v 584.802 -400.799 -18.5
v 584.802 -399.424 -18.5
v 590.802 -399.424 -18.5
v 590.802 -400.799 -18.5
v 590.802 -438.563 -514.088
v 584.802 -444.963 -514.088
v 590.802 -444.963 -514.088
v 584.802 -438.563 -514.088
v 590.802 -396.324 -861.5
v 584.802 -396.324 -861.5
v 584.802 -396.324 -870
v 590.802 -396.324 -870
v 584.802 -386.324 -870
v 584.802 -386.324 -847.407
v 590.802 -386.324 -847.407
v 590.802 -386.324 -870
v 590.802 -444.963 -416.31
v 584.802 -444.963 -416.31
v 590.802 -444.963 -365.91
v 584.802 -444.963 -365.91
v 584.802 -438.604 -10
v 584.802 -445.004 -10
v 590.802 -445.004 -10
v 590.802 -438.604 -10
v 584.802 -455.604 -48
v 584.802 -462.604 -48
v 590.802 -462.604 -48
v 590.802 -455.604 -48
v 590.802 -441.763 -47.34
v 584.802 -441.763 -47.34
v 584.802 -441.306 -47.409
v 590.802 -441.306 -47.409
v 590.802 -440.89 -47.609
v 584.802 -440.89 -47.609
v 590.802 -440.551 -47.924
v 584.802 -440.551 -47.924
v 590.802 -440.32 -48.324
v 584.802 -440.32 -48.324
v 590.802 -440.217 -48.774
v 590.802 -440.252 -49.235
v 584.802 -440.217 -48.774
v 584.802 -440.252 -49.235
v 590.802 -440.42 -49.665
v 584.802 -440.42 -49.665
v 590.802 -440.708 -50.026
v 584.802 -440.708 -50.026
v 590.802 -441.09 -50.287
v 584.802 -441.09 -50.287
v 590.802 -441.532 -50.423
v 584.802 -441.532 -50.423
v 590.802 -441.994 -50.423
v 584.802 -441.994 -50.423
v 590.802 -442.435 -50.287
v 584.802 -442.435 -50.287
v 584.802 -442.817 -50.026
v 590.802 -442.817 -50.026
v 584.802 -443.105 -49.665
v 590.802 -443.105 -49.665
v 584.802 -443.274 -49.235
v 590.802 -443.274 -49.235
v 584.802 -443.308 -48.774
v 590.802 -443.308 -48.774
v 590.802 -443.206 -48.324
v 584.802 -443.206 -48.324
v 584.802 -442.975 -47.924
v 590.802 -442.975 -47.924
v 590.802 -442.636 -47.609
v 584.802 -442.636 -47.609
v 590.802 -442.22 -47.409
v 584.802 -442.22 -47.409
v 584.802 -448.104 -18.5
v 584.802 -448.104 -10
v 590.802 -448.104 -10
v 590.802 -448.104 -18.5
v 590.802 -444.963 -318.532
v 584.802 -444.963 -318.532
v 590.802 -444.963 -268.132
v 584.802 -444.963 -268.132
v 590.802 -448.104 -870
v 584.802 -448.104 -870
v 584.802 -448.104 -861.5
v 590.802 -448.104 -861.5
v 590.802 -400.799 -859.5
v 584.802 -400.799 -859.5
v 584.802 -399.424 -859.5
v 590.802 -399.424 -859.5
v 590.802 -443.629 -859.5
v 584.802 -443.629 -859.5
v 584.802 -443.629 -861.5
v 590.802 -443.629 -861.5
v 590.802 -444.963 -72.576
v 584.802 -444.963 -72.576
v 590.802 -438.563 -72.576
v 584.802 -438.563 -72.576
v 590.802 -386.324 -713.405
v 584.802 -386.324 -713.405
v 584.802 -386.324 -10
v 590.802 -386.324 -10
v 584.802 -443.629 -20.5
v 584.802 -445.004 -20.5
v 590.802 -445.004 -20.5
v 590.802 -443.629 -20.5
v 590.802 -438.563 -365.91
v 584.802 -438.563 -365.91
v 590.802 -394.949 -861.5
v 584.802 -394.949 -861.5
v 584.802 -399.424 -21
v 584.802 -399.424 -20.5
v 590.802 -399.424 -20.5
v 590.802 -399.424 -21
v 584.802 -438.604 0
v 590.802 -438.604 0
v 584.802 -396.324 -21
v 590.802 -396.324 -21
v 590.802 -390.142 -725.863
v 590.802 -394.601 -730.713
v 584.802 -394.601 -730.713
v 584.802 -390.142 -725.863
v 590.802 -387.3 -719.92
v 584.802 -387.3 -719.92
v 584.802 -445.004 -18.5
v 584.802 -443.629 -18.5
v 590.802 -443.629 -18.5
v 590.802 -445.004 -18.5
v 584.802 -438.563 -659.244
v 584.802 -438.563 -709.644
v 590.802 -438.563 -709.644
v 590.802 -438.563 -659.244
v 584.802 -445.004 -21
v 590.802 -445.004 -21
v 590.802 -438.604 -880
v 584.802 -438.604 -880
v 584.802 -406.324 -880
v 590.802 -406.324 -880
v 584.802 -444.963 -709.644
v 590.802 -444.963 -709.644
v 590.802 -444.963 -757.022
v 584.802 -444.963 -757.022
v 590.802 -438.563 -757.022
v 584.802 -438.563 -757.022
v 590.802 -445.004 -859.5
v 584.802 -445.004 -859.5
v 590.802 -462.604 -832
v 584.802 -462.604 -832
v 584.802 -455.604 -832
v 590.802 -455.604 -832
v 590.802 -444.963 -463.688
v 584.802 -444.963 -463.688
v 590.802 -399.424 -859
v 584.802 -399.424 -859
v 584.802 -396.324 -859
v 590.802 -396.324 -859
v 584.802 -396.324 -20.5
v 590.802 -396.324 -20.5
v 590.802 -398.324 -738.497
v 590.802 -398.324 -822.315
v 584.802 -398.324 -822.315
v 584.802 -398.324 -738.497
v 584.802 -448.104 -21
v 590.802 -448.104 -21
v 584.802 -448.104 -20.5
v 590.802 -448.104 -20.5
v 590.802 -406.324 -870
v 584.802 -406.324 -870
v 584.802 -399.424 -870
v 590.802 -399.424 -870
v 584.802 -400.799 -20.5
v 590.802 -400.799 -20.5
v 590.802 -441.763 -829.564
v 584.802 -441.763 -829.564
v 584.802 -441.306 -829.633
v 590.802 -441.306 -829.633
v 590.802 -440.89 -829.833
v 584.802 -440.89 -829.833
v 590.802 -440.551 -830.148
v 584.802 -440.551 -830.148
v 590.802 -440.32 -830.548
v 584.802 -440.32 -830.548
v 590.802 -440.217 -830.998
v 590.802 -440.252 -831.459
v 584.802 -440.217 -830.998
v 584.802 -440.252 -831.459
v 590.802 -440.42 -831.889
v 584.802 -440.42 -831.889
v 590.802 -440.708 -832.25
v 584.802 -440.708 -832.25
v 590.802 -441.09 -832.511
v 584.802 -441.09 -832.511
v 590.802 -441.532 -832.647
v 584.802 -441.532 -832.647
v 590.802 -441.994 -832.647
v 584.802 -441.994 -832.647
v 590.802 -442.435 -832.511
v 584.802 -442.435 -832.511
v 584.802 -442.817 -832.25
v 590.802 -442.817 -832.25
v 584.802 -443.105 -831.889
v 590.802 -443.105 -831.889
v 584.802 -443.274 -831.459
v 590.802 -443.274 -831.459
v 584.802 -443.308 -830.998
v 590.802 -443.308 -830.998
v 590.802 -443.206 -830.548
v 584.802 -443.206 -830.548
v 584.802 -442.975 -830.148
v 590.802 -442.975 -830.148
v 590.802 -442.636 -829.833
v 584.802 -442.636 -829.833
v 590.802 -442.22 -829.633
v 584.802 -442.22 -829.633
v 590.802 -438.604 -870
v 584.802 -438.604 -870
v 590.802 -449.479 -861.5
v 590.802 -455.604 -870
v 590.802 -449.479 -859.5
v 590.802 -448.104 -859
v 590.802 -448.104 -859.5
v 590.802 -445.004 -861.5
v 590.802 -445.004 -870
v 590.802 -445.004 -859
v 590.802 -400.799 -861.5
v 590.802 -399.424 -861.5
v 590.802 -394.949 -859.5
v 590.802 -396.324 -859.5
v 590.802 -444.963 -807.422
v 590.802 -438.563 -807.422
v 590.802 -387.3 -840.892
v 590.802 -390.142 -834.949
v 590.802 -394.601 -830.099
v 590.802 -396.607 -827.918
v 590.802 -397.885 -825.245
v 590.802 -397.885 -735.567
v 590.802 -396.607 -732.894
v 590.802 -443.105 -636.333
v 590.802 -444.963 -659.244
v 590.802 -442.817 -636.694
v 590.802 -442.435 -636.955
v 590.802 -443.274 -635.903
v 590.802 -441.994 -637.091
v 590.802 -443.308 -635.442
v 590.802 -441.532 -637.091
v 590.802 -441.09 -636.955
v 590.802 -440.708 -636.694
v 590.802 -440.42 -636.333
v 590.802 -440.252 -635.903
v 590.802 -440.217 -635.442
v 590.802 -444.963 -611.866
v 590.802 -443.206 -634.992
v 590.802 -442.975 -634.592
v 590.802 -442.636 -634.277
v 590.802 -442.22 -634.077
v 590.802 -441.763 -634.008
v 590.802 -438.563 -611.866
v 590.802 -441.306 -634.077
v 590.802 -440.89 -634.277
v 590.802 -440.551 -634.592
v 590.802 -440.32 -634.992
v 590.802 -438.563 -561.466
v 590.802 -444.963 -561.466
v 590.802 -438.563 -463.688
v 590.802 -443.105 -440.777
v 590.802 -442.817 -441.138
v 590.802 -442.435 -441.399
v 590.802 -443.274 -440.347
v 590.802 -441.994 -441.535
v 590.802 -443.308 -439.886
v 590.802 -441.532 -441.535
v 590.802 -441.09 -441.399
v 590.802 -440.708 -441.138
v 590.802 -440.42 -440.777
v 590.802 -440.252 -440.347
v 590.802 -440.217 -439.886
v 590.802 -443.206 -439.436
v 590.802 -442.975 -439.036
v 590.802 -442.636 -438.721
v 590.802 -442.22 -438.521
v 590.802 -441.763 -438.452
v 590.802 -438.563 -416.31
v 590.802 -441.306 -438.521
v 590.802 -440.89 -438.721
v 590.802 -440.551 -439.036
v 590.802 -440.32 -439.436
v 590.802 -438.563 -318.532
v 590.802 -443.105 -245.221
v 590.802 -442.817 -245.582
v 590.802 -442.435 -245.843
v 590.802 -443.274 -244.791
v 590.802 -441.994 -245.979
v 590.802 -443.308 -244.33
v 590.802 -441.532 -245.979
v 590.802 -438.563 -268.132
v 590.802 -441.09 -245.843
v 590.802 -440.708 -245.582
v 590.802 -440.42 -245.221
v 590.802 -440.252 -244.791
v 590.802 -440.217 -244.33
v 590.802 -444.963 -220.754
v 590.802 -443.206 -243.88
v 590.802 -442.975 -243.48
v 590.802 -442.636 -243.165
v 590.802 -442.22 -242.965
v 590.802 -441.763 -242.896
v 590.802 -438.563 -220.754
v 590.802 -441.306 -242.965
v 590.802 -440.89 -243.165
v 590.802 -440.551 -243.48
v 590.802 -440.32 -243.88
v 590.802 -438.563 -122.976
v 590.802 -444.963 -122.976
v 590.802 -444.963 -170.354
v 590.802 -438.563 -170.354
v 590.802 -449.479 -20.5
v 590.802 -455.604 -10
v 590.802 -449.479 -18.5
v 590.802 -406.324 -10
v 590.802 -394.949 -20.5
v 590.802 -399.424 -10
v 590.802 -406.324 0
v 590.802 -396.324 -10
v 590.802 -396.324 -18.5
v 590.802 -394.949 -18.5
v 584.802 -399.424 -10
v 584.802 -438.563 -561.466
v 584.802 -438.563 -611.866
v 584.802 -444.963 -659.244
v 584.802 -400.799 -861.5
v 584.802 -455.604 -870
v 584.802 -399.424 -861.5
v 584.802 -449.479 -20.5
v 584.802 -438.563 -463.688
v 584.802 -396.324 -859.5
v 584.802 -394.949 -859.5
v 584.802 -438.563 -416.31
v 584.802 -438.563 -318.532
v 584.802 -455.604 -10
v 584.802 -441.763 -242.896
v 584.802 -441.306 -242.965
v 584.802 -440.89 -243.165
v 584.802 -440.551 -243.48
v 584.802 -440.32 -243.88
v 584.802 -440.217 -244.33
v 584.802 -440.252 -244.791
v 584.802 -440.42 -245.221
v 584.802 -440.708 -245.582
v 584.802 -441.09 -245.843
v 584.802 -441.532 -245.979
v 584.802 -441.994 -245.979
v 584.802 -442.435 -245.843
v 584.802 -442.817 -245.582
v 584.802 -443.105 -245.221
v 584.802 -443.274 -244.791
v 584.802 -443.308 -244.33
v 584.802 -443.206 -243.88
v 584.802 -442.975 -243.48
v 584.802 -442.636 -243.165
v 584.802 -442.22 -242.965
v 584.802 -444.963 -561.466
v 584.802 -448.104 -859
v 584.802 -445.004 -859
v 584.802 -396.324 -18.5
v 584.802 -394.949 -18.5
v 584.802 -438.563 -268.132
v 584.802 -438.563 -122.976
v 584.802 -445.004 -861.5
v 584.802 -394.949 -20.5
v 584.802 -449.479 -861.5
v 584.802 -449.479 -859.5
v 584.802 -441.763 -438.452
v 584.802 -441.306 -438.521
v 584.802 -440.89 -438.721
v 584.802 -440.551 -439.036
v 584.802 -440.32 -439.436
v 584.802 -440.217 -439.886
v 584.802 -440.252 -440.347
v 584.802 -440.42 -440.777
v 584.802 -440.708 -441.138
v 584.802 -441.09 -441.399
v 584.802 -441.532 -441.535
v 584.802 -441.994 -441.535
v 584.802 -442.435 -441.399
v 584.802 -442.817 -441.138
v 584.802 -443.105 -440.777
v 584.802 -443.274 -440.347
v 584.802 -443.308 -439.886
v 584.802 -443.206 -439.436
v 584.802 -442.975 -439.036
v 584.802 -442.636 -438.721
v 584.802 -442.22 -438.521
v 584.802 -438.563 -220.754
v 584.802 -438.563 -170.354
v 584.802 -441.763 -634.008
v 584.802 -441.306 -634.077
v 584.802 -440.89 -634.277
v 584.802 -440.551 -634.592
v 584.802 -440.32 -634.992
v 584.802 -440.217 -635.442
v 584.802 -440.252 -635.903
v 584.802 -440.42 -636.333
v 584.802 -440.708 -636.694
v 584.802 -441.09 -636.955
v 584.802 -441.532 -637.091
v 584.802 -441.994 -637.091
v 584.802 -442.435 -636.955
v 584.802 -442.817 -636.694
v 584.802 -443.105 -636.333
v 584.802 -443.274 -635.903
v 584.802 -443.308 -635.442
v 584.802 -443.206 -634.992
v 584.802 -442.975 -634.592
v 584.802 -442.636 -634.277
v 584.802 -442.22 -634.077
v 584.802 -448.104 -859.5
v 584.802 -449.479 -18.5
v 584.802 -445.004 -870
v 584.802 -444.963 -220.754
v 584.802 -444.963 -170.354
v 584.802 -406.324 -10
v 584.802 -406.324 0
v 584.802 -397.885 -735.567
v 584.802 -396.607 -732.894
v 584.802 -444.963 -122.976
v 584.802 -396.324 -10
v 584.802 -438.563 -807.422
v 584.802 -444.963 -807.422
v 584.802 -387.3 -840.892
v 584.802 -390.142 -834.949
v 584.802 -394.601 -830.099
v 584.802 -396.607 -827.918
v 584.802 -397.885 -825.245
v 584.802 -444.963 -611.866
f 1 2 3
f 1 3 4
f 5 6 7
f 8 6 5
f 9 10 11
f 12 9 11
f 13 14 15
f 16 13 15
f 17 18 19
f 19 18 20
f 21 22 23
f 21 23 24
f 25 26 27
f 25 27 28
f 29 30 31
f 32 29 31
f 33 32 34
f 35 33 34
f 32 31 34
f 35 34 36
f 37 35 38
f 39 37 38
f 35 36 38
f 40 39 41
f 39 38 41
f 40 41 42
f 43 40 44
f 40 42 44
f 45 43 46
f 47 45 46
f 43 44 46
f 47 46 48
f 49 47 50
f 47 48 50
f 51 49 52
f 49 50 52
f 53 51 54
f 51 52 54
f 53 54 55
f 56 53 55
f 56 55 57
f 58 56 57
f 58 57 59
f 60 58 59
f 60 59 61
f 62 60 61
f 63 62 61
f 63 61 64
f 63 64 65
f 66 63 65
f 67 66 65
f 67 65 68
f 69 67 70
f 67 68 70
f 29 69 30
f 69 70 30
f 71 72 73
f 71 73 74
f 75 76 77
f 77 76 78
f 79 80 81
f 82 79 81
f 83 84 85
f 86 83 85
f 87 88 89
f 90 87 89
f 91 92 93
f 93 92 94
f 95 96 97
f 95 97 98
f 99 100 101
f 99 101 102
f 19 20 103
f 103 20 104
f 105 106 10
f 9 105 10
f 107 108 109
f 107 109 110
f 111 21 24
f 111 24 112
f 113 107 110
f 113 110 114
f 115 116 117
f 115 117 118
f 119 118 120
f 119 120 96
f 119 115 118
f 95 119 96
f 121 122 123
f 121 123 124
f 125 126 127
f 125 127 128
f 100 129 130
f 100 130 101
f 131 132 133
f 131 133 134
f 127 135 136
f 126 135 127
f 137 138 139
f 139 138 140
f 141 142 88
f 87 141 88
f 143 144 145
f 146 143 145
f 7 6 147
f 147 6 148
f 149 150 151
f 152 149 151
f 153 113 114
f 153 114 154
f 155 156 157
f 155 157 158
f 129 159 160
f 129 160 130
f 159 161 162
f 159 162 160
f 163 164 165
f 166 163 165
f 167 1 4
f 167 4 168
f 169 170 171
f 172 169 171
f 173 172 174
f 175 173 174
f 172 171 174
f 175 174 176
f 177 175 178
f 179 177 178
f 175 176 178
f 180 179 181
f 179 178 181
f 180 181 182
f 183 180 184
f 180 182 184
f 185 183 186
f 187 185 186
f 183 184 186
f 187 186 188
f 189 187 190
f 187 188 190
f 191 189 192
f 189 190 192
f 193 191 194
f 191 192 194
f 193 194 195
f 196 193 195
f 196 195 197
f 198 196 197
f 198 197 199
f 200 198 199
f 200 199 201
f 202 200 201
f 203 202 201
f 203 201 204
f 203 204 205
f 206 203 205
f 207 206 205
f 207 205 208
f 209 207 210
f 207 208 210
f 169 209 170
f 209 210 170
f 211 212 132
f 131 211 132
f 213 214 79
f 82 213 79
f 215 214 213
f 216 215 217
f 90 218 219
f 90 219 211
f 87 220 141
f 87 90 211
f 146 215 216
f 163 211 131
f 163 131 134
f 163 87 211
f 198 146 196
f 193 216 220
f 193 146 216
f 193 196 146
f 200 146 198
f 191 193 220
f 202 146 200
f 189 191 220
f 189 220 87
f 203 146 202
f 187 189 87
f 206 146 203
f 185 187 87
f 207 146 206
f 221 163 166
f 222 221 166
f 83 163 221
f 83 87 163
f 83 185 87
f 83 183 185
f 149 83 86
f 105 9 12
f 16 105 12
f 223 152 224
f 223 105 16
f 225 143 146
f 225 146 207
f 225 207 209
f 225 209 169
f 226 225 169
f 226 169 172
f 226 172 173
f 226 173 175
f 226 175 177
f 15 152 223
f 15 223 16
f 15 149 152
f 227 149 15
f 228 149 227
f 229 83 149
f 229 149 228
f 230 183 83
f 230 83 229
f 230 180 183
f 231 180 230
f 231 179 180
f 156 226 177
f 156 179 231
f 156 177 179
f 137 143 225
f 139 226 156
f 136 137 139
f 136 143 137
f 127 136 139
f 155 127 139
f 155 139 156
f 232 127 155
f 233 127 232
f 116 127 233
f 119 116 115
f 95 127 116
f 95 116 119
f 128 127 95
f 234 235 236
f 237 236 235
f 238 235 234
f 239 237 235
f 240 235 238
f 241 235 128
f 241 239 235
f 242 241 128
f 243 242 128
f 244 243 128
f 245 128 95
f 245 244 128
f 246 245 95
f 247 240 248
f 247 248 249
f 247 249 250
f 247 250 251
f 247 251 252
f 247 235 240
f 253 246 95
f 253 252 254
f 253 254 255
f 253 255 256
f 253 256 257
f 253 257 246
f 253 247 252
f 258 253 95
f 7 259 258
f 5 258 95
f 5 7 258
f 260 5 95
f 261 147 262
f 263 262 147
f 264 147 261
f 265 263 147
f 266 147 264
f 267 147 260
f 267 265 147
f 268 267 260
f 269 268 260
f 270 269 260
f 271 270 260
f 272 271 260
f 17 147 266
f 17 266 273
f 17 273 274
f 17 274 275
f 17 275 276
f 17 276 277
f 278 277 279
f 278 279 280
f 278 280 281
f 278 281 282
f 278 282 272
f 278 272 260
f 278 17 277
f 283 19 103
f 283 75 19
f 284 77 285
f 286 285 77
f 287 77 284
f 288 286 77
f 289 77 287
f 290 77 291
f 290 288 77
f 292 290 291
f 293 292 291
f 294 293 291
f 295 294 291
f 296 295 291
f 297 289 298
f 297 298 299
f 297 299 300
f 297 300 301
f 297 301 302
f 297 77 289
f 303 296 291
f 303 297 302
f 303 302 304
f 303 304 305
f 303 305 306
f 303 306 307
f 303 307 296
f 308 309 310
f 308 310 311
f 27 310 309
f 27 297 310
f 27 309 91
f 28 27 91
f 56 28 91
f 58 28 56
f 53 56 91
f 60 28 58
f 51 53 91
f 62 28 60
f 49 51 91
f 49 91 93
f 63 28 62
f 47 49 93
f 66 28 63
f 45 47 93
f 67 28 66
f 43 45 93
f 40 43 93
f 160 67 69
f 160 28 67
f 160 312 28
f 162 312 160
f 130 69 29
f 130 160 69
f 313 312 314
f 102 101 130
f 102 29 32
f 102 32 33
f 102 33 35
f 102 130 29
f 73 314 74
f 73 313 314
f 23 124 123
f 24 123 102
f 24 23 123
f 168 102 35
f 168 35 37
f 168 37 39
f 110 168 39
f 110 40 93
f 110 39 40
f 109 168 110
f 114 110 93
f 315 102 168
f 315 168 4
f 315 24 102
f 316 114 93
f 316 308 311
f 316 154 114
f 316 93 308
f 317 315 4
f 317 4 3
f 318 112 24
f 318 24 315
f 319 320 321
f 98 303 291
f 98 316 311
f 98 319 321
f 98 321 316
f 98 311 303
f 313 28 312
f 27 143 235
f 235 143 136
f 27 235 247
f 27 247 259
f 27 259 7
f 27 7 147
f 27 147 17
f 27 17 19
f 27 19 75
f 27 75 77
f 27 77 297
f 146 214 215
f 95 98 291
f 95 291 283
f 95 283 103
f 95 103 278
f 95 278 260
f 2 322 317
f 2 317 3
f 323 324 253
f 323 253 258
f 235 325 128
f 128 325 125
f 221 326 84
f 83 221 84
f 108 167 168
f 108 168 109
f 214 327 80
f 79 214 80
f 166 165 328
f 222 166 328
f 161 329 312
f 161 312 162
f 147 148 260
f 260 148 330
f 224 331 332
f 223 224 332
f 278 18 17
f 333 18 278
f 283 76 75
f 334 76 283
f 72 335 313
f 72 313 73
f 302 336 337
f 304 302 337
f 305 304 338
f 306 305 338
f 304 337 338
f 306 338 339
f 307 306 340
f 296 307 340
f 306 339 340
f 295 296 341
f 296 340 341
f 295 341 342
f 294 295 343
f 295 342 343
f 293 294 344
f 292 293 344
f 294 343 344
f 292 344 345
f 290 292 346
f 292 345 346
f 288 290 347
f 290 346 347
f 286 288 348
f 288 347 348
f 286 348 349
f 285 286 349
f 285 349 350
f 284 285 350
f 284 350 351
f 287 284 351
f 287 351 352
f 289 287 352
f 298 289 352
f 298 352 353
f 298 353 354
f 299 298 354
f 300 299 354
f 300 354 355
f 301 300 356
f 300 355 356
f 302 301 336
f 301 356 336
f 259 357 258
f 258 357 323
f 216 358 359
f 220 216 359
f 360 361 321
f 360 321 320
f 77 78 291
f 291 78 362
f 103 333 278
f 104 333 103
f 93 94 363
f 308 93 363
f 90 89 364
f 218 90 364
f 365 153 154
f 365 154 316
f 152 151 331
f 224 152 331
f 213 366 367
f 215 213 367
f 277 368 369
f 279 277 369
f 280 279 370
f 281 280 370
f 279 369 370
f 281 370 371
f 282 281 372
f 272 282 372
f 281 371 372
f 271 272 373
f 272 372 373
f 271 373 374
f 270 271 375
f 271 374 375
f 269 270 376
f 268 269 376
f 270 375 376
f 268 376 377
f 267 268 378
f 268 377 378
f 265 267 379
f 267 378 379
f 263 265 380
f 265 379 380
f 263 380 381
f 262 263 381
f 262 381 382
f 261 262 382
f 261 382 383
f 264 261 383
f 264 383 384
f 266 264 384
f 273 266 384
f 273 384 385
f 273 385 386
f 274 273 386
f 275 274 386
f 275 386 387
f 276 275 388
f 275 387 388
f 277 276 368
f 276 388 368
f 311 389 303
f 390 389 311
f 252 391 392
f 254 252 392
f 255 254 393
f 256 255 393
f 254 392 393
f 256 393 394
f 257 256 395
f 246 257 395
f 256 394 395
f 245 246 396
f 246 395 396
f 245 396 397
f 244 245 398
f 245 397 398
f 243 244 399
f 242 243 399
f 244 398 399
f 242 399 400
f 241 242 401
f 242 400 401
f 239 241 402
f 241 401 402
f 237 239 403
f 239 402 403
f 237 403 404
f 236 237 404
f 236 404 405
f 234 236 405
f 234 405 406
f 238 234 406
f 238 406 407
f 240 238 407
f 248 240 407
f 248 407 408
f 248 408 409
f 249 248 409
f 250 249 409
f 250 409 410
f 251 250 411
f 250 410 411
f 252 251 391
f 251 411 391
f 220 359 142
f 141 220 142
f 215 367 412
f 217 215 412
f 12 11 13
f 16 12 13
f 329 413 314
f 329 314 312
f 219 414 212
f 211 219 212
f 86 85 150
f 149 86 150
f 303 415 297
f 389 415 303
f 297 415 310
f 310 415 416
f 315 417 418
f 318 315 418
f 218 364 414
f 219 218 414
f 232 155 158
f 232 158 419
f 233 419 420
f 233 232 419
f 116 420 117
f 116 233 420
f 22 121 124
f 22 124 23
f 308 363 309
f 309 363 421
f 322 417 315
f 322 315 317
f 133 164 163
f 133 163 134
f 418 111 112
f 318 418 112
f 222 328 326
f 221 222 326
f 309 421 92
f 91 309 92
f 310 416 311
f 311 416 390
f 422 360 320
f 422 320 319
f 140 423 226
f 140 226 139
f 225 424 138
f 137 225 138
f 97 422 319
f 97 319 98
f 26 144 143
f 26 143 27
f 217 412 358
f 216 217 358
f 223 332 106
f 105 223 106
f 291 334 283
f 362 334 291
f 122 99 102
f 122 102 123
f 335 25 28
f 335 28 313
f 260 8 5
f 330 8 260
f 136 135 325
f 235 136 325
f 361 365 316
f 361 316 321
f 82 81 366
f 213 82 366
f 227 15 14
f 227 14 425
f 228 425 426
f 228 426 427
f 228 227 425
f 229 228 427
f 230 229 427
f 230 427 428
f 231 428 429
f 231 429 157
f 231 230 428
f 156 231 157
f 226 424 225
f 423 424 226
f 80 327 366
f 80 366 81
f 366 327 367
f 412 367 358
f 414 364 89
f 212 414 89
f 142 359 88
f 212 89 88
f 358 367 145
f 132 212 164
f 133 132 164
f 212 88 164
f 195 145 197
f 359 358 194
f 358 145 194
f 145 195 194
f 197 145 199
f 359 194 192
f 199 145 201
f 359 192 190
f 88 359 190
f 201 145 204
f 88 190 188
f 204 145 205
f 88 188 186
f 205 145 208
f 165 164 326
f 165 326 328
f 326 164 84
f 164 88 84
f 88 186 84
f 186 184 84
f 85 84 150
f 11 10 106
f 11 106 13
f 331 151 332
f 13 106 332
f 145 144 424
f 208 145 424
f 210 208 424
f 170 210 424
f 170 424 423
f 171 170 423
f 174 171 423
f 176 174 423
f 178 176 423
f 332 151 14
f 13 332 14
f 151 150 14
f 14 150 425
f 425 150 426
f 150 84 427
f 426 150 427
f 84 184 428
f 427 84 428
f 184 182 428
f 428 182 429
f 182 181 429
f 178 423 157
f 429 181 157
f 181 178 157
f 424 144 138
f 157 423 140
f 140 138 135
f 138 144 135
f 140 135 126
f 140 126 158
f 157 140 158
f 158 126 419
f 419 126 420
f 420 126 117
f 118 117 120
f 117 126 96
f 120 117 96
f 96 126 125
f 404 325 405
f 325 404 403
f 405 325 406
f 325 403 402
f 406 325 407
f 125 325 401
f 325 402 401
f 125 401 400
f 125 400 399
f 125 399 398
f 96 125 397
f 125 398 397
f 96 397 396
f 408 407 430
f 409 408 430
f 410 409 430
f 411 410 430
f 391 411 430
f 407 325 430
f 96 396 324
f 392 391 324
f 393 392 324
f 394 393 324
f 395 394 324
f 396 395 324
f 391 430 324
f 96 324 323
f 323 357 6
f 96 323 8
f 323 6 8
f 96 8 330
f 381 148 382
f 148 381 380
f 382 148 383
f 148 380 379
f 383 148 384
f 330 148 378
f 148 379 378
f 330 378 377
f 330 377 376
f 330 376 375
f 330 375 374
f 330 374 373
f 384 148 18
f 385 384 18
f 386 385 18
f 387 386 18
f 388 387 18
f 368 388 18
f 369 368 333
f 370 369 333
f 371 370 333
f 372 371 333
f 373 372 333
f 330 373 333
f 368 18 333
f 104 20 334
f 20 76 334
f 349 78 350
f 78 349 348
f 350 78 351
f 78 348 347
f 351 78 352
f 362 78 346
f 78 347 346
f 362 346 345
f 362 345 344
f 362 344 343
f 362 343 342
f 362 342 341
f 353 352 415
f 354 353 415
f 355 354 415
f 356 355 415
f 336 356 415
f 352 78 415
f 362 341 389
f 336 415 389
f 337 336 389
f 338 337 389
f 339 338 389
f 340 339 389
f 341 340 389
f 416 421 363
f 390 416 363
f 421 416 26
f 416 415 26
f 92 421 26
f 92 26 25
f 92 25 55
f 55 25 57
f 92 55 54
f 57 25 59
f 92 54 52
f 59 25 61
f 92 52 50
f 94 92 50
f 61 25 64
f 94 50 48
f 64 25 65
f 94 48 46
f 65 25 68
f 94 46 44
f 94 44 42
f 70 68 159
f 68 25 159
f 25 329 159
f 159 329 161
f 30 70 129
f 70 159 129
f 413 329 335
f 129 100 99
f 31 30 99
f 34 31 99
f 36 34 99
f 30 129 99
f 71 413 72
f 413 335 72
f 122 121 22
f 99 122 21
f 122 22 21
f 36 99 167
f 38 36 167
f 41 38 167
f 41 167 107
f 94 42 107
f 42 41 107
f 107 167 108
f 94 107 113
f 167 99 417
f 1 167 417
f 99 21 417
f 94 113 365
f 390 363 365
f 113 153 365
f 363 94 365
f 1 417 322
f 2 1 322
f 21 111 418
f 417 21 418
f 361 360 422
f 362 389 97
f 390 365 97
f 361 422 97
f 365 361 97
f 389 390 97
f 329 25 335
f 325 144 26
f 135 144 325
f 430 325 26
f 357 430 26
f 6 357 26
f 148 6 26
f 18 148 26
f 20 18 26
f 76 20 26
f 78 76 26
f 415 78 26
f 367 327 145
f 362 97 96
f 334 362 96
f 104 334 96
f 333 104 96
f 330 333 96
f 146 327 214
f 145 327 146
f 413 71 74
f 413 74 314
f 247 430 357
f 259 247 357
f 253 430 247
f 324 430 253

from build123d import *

# Parameters (mm, degrees)
SZKIC1_W                    = 10
SZKIC1_H                    = 72.28
DODANIE_WYCI_GNI_CIE1_DEPTH = 880
WYTNIJ_WYCI_GNI_CIE1_DEPTH  = 10
PRZENIE_CIAN_1_BY           = 4
SZKIC11_R                   = 1.55
WYTNIJ_WYCI_GNI_CIE5_DEPTH  = 6
SZYK_LINIOWY2_COUNT         = 5
SZYK_LINIOWY2_PITCH         = 195.556
SZKIC4_W                    = 10
SZKIC4_H                    = 20
WYTNIJ_WYCI_GNI_CIE2_DEPTH  = 10
SZKIC12_W                   = 784
SZKIC12_H                   = 6
DODANIE_WYCI_GNI_CIE2_DEPTH = 6
SZKIC15_W                   = 38
SZKIC15_H                   = 3
WYTNIJ_WYCI_GNI_CIE8_DEPTH  = 6
SZKIC13_W                   = 784
SZKIC13_H                   = 2
WYTNIJ_WYCI_GNI_CIE6_DEPTH  = 996.134585066
WYTNIJ_WYCI_GNI_CIE3_DEPTH  = 10
SZYK_LINIOWY1_COUNT         = 2
SZYK_LINIOWY1_PITCH         = 48.68
LUSTRO1_COPY_1_DEPTH        = 10
SZKIC8_W                    = 50.4
SZKIC8_H                    = 6.4
WYTNIJ_WYCI_GNI_CIE4_DEPTH  = 6


with BuildPart() as part:
    # Szkic1 → Dodanie-wyciągnięcie1 (new body)
    with BuildSketch(Plane.XY):
        with Locations((589.801874809, -422.463962956)):
            Rectangle(SZKIC1_W, SZKIC1_H)
    extrude(amount=-DODANIE_WYCI_GNI_CIE1_DEPTH)

    # Szkic3 → Wytnij-wyciągnięcie1 (cut)
    with BuildSketch(Plane(origin=(594.801874809, 0, 0), x_dir=(0, 0, -1), z_dir=(1, 0, 0))):
        with BuildLine():
            Line((713.404941199, -386.323962956), (847.40701842, -386.323962956))
            ThreePointArc((847.40701842, -386.323962956), (837.81446616, -388.499721921), (830.099329099, -394.601168148))
            ThreePointArc((830.099329099, -394.601168148), (826.629332702, -397.345383352), (822.314941199, -398.323962956))
            Line((822.314941199, -398.323962956), (738.49701842, -398.323962956))
            ThreePointArc((738.49701842, -398.323962956), (734.182626917, -397.345383352), (730.71263052, -394.601168148))
            ThreePointArc((730.71263052, -394.601168148), (722.997493459, -388.499721921), (713.404941199, -386.323962956))
        make_face()
    extrude(amount=-WYTNIJ_WYCI_GNI_CIE1_DEPTH, mode=Mode.SUBTRACT)

    # Przenieś ścianę1: a face moved inward by 4.0
    extrude(part.faces().sort_by_distance((594.801874809, -423.080552613, -433.108983903))[0], amount=PRZENIE_CIAN_1_BY, dir=(-1, 0, 0), mode=Mode.SUBTRACT)

    # Szkic11 → Wytnij-wyciągnięcie5 (cut)
    with BuildSketch(Plane.ZY.offset(-584.801874809)):
        with Locations((-48.89, -441.762668339)):
            Circle(SZKIC11_R)
    wytnij_wyci_gni_cie5 = extrude(amount=-WYTNIJ_WYCI_GNI_CIE5_DEPTH, mode=Mode.SUBTRACT)

    # Szyk liniowy2: Wytnij-wyciągnięcie5 ×5
    with Locations(*[(0, 0, -i * SZYK_LINIOWY2_PITCH) for i in range(1, SZYK_LINIOWY2_COUNT)]):
        add(wytnij_wyci_gni_cie5, mode=Mode.SUBTRACT)

    # Szkic4 → Wytnij-wyciągnięcie2 (cut)
    with BuildSketch(Plane.ZY.offset(-584.801874809)):
        with Locations((-5, -396.323962956)):
            Rectangle(SZKIC4_W, SZKIC4_H)
        with Locations((-5, -448.603962956)):
            Rectangle(SZKIC4_W, SZKIC4_H)
    wytnij_wyci_gni_cie2 = extrude(amount=-WYTNIJ_WYCI_GNI_CIE2_DEPTH, mode=Mode.SUBTRACT)

    # Lustro2: Wytnij-wyciągnięcie2 across plane
    add(wytnij_wyci_gni_cie2.mirror(Plane.XY.offset(-440)), mode=Mode.SUBTRACT)

    # Szkic12 → Dodanie-wyciągnięcie2 (add)
    with BuildSketch(Plane.ZY.offset(-584.801874809)):
        with Locations((-440, -461.603962956)):
            Rectangle(SZKIC12_W, SZKIC12_H)
    extrude(amount=-DODANIE_WYCI_GNI_CIE2_DEPTH)

    # Szkic15 → Wytnij-wyciągnięcie8 (cut)
    with BuildSketch(Plane.ZY.offset(-584.801874809)):
        with Locations((-851, -457.103962956)):
            Rectangle(SZKIC15_W, SZKIC15_H)
        with Locations((-29, -457.103962956)):
            Rectangle(SZKIC15_W, SZKIC15_H)
    extrude(amount=-WYTNIJ_WYCI_GNI_CIE8_DEPTH, mode=Mode.SUBTRACT)

    # Szkic13 → Wytnij-wyciągnięcie6 (cut, through all)
    with BuildSketch(Plane.ZY.offset(-584.801874809)):
        with Locations((-440, -463.603962956)):
            Rectangle(SZKIC13_W, SZKIC13_H)
    extrude(amount=-WYTNIJ_WYCI_GNI_CIE6_DEPTH, mode=Mode.SUBTRACT)

    # Szkic5 → Wytnij-wyciągnięcie3 (cut)
    with BuildSketch(Plane.ZY.offset(-584.801874809)):
        Polygon((-21, -396.323962956), (-20.5, -396.323962956), (-20.5, -394.948962956), (-18.5, -394.948962956), (-18.5, -396.323962956), (-10, -396.323962956), (-10, -399.423962956), (-18.5, -399.423962956), (-18.5, -400.798962956), (-20.5, -400.798962956), (-20.5, -399.423962956), (-21, -399.423962956), align=None)
    wytnij_wyci_gni_cie3 = extrude(amount=-WYTNIJ_WYCI_GNI_CIE3_DEPTH, mode=Mode.SUBTRACT)

    # Szyk liniowy1: Wytnij-wyciągnięcie3 ×2
    with Locations(*[(0, -i * SZYK_LINIOWY1_PITCH, 0) for i in range(1, SZYK_LINIOWY1_COUNT)]):
        add(wytnij_wyci_gni_cie3, mode=Mode.SUBTRACT)

    # Lustro1: Wytnij-wyciągnięcie3 across plane
    add(wytnij_wyci_gni_cie3.mirror(Plane.XY.offset(-440)), mode=Mode.SUBTRACT)

    # Lustro1 copy 1 sketch → Lustro1 copy 1 (cut)
    with BuildSketch(Plane(origin=(584.801874809, -48.68, -880), x_dir=(0, 0, -1), z_dir=(-1, 0, 0))):
        Polygon((-21, 396.323962956), (-20.5, 396.323962956), (-20.5, 394.948962956), (-18.5, 394.948962956), (-18.5, 396.323962956), (-10, 396.323962956), (-10, 399.423962956), (-18.5, 399.423962956), (-18.5, 400.798962956), (-20.5, 400.798962956), (-20.5, 399.423962956), (-21, 399.423962956), align=None)
    extrude(amount=-LUSTRO1_COPY_1_DEPTH, mode=Mode.SUBTRACT)

    # Szkic8 → Wytnij-wyciągnięcie4 (cut)
    with BuildSketch(Plane.ZY.offset(-584.801874809)):
        Polygon((-106.468297453, -438.562668339), (-122.976, -438.562668339), (-122.976, -444.962668339), (-106.50664325, -444.962668339), (-72.576, -444.962668339), (-72.576, -438.562668339), align=None)
        with Locations((-195.554, -441.762668339)):
            Rectangle(SZKIC8_W, SZKIC8_H)
        with Locations((-293.332, -441.762668339)):
            Rectangle(SZKIC8_W, SZKIC8_H)
        with Locations((-391.11, -441.762668339)):
            Rectangle(SZKIC8_W, SZKIC8_H)
        with Locations((-488.888, -441.762668339)):
            Rectangle(SZKIC8_W, SZKIC8_H)
        with Locations((-586.666, -441.762668339)):
            Rectangle(SZKIC8_W, SZKIC8_H)
        with Locations((-684.444, -441.762668339)):
            Rectangle(SZKIC8_W, SZKIC8_H)
        with Locations((-782.222, -441.762668339)):
            Rectangle(SZKIC8_W, SZKIC8_H)
    extrude(amount=-WYTNIJ_WYCI_GNI_CIE4_DEPTH, mode=Mode.SUBTRACT)


solid = part.part
